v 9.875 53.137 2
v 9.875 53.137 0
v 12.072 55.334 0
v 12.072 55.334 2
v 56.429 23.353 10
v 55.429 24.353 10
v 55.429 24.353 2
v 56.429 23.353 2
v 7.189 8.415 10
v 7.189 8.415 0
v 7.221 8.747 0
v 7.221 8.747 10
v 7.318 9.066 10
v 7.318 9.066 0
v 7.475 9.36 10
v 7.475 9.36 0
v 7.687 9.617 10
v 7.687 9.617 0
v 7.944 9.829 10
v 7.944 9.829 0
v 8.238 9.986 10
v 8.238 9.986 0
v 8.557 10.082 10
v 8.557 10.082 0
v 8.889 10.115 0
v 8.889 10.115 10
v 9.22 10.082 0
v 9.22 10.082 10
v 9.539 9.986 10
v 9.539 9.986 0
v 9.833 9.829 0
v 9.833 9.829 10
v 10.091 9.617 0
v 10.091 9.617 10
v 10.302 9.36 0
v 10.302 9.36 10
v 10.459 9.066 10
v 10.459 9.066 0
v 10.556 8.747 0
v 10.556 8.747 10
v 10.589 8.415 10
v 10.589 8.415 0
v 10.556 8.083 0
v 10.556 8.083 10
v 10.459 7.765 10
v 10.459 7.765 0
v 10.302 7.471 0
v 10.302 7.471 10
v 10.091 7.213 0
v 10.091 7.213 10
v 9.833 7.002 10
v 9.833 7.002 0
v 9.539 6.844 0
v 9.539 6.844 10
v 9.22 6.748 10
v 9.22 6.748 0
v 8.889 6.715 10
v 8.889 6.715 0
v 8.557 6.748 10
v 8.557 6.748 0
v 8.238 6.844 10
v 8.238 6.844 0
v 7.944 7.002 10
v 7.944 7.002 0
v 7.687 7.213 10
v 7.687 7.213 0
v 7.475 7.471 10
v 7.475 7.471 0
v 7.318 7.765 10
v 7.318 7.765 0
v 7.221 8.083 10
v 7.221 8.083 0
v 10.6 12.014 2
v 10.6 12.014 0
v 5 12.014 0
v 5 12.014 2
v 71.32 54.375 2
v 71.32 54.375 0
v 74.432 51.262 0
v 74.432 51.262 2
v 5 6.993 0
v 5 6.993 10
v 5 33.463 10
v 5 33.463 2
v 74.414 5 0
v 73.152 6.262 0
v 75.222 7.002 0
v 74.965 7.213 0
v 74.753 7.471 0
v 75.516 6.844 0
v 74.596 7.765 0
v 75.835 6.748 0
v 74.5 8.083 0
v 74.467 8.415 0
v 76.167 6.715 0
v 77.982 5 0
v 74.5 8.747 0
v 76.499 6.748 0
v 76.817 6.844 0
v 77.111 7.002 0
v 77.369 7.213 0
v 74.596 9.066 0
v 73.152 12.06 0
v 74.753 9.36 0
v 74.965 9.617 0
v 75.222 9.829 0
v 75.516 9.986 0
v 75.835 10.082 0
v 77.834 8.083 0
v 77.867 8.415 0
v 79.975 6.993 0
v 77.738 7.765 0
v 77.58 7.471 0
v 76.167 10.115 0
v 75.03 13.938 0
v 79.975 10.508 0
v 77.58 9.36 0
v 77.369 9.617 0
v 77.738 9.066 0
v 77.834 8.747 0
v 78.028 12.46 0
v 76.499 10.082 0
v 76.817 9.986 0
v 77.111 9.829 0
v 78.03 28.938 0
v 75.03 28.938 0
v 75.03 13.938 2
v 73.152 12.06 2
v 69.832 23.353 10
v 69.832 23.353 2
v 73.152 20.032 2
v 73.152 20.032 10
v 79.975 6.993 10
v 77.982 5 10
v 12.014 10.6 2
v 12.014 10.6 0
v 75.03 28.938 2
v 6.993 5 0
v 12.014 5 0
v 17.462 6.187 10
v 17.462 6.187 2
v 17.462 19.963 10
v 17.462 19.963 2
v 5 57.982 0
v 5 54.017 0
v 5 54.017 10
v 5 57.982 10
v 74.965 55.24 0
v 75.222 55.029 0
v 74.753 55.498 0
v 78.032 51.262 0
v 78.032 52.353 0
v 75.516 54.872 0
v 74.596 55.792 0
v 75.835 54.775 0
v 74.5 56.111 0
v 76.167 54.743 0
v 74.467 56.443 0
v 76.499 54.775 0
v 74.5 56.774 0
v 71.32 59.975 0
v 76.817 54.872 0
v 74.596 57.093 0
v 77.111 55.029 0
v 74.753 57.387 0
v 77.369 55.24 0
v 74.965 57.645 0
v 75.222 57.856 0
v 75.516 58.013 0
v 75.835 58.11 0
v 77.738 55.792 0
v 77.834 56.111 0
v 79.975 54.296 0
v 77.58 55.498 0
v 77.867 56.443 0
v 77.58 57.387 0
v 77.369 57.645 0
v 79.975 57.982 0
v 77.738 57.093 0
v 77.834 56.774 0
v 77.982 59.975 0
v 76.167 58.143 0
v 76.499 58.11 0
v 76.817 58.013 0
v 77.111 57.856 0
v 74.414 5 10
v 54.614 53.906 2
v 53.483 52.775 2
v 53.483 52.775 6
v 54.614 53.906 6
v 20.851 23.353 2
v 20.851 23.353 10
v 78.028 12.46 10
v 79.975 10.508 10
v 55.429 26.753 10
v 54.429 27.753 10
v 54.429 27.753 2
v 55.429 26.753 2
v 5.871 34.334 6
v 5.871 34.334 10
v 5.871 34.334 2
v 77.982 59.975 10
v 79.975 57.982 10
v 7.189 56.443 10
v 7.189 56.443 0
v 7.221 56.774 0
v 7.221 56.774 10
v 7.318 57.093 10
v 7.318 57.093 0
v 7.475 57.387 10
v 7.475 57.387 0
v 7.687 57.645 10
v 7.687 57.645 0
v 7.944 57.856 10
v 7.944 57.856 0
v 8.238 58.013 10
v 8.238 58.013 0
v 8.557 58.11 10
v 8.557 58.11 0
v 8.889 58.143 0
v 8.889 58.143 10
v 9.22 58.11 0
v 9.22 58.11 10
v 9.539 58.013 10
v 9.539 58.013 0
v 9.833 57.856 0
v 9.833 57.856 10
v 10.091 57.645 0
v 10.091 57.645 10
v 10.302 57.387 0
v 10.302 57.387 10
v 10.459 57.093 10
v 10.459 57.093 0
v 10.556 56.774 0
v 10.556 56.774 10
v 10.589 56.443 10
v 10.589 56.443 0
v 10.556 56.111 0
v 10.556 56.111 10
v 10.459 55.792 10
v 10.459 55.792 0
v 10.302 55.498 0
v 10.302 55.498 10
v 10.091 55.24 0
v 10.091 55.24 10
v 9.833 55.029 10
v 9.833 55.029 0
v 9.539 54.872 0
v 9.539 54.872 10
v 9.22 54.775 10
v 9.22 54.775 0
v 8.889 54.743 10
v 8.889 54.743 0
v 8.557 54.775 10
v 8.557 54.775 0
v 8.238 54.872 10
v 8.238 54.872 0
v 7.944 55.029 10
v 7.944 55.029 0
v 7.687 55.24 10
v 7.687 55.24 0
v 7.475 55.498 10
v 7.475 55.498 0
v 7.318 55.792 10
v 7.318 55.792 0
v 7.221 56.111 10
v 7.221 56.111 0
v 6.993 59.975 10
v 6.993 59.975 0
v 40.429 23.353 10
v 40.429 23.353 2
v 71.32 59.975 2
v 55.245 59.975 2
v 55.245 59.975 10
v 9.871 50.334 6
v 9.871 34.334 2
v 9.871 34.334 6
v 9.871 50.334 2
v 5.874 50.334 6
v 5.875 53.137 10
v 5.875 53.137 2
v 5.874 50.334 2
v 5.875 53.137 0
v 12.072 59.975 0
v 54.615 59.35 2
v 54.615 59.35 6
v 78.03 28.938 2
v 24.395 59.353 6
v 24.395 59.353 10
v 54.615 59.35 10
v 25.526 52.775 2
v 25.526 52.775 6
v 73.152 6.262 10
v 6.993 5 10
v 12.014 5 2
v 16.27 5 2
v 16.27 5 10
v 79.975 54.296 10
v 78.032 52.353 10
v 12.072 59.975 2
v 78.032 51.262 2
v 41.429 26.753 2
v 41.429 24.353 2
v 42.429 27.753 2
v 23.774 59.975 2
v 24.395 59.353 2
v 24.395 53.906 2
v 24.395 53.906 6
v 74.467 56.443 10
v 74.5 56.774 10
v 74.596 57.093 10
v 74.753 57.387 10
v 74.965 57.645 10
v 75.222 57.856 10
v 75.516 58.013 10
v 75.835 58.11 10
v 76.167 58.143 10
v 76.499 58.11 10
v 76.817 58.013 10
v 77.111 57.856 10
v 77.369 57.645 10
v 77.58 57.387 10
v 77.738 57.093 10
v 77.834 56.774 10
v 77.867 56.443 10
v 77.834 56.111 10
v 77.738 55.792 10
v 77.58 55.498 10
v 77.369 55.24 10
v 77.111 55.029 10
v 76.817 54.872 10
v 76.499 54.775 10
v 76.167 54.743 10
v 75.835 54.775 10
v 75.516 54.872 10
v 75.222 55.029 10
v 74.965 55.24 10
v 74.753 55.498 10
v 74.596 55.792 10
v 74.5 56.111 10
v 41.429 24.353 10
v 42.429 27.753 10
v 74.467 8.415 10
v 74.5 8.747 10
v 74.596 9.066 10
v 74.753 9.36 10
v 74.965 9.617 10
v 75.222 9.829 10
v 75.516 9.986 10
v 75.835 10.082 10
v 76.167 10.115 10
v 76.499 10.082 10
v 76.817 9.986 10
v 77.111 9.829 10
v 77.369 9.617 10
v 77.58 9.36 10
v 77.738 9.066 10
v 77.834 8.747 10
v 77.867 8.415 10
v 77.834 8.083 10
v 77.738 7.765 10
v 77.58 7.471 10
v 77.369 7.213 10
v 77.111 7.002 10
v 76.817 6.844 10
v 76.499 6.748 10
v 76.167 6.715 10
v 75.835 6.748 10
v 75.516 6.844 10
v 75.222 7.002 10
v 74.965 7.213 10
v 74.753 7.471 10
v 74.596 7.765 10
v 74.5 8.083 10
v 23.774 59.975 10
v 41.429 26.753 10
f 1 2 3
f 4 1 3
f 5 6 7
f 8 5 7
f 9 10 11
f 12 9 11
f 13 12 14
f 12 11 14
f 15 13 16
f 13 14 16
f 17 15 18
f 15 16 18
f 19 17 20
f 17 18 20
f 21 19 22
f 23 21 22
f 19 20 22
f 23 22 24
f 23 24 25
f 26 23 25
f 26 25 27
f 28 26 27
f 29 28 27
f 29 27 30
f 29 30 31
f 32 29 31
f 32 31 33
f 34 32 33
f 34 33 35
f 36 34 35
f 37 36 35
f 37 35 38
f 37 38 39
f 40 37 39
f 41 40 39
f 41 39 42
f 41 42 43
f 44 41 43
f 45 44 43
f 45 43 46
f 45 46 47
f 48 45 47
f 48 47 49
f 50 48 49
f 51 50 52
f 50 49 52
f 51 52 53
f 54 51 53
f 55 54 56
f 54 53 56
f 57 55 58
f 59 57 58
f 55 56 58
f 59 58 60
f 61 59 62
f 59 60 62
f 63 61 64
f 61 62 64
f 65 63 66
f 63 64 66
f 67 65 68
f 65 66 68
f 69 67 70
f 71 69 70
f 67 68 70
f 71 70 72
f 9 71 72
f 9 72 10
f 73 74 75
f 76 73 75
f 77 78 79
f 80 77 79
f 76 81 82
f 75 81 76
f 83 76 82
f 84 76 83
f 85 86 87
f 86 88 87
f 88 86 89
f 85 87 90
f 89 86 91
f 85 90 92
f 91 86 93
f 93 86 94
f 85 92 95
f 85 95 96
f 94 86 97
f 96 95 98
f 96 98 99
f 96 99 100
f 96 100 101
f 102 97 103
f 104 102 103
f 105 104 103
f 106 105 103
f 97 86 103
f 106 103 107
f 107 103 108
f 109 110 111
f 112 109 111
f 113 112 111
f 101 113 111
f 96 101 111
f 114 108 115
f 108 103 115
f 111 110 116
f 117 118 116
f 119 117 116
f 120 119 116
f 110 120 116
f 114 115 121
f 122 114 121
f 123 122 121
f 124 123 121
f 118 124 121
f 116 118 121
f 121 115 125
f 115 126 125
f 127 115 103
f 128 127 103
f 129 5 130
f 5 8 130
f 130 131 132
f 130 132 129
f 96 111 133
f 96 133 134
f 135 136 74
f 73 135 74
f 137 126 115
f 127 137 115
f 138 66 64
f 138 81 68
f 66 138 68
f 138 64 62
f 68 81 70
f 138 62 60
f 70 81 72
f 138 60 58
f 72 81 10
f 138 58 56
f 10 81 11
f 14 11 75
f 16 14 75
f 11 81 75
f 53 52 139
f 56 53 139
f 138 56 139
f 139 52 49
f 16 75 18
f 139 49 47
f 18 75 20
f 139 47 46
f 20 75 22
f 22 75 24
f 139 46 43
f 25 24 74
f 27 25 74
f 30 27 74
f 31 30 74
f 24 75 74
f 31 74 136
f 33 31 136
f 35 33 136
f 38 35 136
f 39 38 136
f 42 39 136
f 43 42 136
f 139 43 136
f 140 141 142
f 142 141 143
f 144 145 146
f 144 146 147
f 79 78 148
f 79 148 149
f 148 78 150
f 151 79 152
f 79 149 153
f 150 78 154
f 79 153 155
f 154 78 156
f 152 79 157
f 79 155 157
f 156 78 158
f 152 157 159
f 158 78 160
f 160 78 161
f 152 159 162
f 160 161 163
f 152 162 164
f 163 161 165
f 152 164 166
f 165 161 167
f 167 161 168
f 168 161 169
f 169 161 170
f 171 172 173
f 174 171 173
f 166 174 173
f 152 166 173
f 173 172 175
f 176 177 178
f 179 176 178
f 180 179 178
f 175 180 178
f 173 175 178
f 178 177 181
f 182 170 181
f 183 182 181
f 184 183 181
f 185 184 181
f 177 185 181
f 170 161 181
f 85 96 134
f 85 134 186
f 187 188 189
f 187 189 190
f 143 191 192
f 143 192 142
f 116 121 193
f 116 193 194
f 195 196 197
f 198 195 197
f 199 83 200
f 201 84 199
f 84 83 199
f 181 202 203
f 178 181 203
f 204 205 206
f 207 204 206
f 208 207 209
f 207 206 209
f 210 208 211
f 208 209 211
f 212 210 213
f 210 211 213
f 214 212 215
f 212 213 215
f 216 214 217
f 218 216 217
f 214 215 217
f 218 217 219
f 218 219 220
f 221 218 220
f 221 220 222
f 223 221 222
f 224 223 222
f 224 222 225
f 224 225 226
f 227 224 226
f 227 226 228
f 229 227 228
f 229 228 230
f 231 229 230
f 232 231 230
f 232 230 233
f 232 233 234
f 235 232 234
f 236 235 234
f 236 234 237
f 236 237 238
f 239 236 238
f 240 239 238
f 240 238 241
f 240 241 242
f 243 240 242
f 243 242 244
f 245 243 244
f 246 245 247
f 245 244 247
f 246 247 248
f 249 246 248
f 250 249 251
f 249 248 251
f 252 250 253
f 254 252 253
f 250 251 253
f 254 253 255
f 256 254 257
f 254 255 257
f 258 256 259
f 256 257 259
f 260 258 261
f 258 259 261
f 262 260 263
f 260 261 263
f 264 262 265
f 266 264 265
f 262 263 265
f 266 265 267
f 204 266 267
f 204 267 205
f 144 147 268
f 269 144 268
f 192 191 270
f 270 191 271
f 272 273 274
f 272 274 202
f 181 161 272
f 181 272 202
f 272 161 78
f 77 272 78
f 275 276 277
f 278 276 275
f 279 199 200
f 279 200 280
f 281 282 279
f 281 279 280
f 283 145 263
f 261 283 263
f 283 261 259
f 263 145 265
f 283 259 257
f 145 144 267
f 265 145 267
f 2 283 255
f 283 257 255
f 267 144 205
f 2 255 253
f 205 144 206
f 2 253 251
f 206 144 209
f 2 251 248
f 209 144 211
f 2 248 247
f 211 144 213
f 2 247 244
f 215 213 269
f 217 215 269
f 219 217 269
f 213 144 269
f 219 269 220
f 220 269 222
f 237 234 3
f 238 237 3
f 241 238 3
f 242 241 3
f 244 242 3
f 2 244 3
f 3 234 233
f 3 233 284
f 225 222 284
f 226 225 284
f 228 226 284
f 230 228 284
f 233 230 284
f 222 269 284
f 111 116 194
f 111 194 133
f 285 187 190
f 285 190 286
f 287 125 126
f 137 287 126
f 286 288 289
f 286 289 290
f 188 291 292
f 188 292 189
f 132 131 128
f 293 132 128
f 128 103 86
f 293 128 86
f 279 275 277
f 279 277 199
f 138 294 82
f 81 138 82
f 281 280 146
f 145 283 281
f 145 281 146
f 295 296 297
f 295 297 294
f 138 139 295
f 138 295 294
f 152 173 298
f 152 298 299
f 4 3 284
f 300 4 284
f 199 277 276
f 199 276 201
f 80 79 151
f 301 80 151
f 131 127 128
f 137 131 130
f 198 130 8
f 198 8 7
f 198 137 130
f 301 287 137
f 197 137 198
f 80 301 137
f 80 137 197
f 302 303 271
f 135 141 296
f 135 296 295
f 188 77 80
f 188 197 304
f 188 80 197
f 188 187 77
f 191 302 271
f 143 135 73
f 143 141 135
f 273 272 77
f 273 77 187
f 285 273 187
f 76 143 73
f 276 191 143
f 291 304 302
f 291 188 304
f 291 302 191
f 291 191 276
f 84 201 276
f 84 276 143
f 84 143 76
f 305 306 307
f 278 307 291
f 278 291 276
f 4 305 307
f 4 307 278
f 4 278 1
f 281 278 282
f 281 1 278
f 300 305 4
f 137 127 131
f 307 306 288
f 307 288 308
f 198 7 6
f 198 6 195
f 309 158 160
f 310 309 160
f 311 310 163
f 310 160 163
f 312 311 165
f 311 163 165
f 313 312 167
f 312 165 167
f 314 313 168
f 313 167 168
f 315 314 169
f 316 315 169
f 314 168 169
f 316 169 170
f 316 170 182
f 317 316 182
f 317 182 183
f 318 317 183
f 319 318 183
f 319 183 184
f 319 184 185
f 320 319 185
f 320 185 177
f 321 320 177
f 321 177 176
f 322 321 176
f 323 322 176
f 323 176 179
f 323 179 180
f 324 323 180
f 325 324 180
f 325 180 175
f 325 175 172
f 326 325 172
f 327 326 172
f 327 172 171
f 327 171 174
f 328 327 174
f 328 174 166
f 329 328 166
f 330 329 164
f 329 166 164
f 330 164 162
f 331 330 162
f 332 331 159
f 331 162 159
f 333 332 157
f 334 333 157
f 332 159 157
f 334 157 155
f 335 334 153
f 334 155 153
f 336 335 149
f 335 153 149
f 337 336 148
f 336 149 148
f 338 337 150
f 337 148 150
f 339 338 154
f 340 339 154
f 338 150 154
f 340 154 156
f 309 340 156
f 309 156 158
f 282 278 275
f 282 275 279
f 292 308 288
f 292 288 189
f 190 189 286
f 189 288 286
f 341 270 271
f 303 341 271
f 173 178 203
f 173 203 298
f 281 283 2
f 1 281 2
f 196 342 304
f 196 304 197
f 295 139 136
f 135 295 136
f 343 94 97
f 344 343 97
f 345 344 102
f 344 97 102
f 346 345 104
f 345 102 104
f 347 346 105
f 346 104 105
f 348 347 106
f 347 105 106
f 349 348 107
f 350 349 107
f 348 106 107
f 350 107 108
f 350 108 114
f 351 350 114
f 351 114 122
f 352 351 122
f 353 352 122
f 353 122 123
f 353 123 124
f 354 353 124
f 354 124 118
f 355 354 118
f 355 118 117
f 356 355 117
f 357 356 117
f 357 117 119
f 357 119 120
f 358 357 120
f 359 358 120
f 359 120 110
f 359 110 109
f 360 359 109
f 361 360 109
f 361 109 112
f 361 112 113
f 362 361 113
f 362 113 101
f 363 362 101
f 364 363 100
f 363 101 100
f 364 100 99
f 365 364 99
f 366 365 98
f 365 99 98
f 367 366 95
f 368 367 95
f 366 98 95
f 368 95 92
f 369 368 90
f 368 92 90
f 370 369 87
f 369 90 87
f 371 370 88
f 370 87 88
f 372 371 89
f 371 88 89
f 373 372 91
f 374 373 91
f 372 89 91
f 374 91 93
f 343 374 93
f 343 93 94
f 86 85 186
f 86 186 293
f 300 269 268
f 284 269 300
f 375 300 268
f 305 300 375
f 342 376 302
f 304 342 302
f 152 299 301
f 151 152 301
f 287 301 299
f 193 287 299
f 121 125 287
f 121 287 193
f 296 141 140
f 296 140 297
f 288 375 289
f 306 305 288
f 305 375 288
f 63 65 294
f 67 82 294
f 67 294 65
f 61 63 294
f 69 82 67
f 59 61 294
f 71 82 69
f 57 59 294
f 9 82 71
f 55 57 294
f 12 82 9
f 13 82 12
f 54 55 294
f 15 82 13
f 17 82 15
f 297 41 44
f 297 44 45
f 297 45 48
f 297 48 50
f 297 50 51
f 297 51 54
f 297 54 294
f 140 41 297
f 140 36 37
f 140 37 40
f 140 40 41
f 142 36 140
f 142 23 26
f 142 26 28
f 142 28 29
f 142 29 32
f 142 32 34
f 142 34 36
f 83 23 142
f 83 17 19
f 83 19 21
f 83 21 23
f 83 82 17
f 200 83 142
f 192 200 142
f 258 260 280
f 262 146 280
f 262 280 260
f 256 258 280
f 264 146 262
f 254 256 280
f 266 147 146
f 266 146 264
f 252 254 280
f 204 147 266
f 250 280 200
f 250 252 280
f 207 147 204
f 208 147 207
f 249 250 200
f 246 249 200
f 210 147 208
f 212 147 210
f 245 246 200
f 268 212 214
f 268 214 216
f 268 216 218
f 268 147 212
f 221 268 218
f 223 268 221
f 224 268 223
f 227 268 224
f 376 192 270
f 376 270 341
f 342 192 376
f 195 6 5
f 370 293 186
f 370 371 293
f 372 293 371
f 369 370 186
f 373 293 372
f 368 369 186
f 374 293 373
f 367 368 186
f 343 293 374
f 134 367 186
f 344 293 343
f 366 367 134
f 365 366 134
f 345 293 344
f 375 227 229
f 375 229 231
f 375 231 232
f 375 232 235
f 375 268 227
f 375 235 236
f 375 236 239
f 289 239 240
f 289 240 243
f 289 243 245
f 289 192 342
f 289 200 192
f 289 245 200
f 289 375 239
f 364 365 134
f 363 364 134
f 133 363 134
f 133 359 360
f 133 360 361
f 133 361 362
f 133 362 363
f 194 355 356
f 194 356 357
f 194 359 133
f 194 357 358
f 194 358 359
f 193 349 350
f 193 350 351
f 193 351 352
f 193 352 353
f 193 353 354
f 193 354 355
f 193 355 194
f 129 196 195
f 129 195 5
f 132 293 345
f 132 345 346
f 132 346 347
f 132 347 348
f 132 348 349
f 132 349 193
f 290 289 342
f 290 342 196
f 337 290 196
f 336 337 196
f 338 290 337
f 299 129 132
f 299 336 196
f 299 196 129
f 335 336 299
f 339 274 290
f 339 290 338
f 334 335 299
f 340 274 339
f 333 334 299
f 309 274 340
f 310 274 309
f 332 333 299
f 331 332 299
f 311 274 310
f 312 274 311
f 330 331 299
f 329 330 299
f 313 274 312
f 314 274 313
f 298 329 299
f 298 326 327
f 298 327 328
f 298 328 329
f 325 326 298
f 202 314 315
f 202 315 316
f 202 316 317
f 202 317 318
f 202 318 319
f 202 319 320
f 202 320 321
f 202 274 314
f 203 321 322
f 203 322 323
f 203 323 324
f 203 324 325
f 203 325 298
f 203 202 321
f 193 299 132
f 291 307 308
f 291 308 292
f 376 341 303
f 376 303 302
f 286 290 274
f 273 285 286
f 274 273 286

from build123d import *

# Parameters (mm, degrees)
SKETCH_1_W           = 85
SKETCH_1_H           = 65
EXTRUDE_1_DEPTH      = 10
CUT_EXTRUDE_1_REACH  = 109.471
SKETCH_2_R           = 1.7
CUT_EXTRUDE_2_REACH  = 109.471
SKETCH_3_W           = 85
SKETCH_3_H           = 65
CUT_EXTRUDE_4_REACH  = 102.464
CUT_EXTRUDE_7_DEPTH  = 6
SKETCH_6_W           = 4
SKETCH_6_H           = 16
CUT_EXTRUDE_8_DEPTH  = 6
CUT_EXTRUDE_11_DEPTH = 2
SKETCH_15_W          = 14
SKETCH_15_H          = 4.4
CUT_EXTRUDE_13_DEPTH = 8
CHAMFER_1_SIZE       = 1


with BuildPart() as part:
    # 草图1 → 凸台-拉伸1 (new body)
    with BuildSketch(Plane.XY):
        with Locations((42.5, 32.5)):
            Rectangle(SKETCH_1_W, SKETCH_1_H)
    extrude(amount=EXTRUDE_1_DEPTH)

    # 草图2 → 切除-拉伸1 (cut, up to next)
    with BuildSketch(Plane(origin=(0, 0, 0), x_dir=(-1, 0, 0), z_dir=(0, 0, -1)), mode=Mode.PRIVATE) as cut_extrude_1_sk1:
        with Locations((-76.166921514, 56.442524765)):
            Circle(SKETCH_2_R)
    cut_extrude_1_tool1 = extrude(cut_extrude_1_sk1.sketch, amount=-CUT_EXTRUDE_1_REACH, mode=Mode.PRIVATE) & part.part
    # 草图2 → 切除-拉伸1 (cut, up to next)
    with BuildSketch(Plane(origin=(0, 0, 0), x_dir=(-1, 0, 0), z_dir=(0, 0, -1)), mode=Mode.PRIVATE) as cut_extrude_1_sk2:
        with Locations((-8.888803658, 56.442524765)):
            Circle(SKETCH_2_R)
    cut_extrude_1_tool2 = extrude(cut_extrude_1_sk2.sketch, amount=-CUT_EXTRUDE_1_REACH, mode=Mode.PRIVATE) & part.part
    # 草图2 → 切除-拉伸1 (cut, up to next)
    with BuildSketch(Plane(origin=(0, 0, 0), x_dir=(-1, 0, 0), z_dir=(0, 0, -1)), mode=Mode.PRIVATE) as cut_extrude_1_sk3:
        with Locations((-76.166921514, 8.41508509)):
            Circle(SKETCH_2_R)
    cut_extrude_1_tool3 = extrude(cut_extrude_1_sk3.sketch, amount=-CUT_EXTRUDE_1_REACH, mode=Mode.PRIVATE) & part.part
    # 草图2 → 切除-拉伸1 (cut, up to next)
    with BuildSketch(Plane(origin=(0, 0, 0), x_dir=(-1, 0, 0), z_dir=(0, 0, -1)), mode=Mode.PRIVATE) as cut_extrude_1_sk4:
        with Locations((-8.888803658, 8.41508509)):
            Circle(SKETCH_2_R)
    cut_extrude_1_tool4 = extrude(cut_extrude_1_sk4.sketch, amount=-CUT_EXTRUDE_1_REACH, mode=Mode.PRIVATE) & part.part
    add(cut_extrude_1_tool1.solids().sort_by_distance((76.166922, 56.442525, 0))[0], mode=Mode.SUBTRACT)
    add(cut_extrude_1_tool2.solids().sort_by_distance((8.888804, 56.442525, 0))[0], mode=Mode.SUBTRACT)
    add(cut_extrude_1_tool3.solids().sort_by_distance((76.166922, 8.415085, 0))[0], mode=Mode.SUBTRACT)
    add(cut_extrude_1_tool4.solids().sort_by_distance((8.888804, 8.415085, 0))[0], mode=Mode.SUBTRACT)

    # 草图3 → 切除-拉伸2 (cut, up to next)
    with BuildSketch(Plane(origin=(0, 0, 0), x_dir=(-1, 0, 0), z_dir=(0, 0, -1)), mode=Mode.PRIVATE) as cut_extrude_2_sk1:
        with Locations((-42.5, 32.5)):
            Rectangle(SKETCH_3_W, SKETCH_3_H)
        Polygon((-5, 33.462892894), (-5.871324699, 34.334217592), (-5.87504445, 53.137061214), (-5, 54.017366187), (-5, 57.982143592), (-6.992565577, 59.974709169), (-23.773560915, 59.974709169), (-24.394872914, 59.353397171), (-54.61482093, 59.349677419), (-55.245113202, 59.974709169), (-77.982184232, 59.974709169), (-79.974749809, 57.982143592), (-79.97474981, 54.295829484), (-78.032030648, 52.353110322), (-78.028310897, 12.45999492), (-79.97474981, 10.508295484), (-79.97474981, 6.992565577), (-77.982184232, 5), (-74.414239441, 5), (-73.152434681, 6.26180476), (-60.043505207, 6.265524511), (-58.772720173, 5), (-32.926479725, 5), (-31.743585303, 6.182894422), (-17.461559563, 6.186614173), (-16.269684867, 5), (-6.992565577, 5), (-5, 6.992565577), align=None, mode=Mode.SUBTRACT)
    cut_extrude_2_tool1 = extrude(cut_extrude_2_sk1.sketch, amount=-CUT_EXTRUDE_2_REACH, mode=Mode.PRIVATE) & part.part
    add(cut_extrude_2_tool1.solids().sort_by_distance((42.5, 63.929953, 0))[0], mode=Mode.SUBTRACT)

    # 草图4 → 切除-拉伸4 (cut, up to next)
    with BuildSketch(Plane(origin=(0, 0, 0), x_dir=(-1, 0, 0), z_dir=(0, 0, -1)), mode=Mode.PRIVATE) as cut_extrude_4_sk1:
        Polygon((-73.152434681, 6.26180476), (-73.152434681, 20.032317315), (-69.831576581, 23.353175415), (-46.787984184, 23.353175415), (-20.851296271, 23.353175415), (-17.461559563, 19.963438707), (-17.461559563, 6.186614173), (-17.461559563, 0.193960815), (-73.152434681, 0.193960815), align=None)
    cut_extrude_4_tool1 = extrude(cut_extrude_4_sk1.sketch, amount=-CUT_EXTRUDE_4_REACH, mode=Mode.PRIVATE) & part.part
    add(cut_extrude_4_tool1.solids().sort_by_distance((45.311727, 11.681443, 0))[0], mode=Mode.SUBTRACT)

    # 草图5 → 切除-拉伸7 (cut)
    with BuildSketch(Plane(origin=(0, 0, 0), x_dir=(-1, 0, 0), z_dir=(0, 0, -1))):
        Polygon((-24.394872914, 59.353397171), (-24.394872914, 53.906418167), (-25.526104495, 52.774908066), (-53.482640788, 52.774908066), (-54.614150889, 53.906139647), (-54.61482093, 59.349677419), align=None)
    extrude(amount=-CUT_EXTRUDE_7_DEPTH, mode=Mode.SUBTRACT)

    # 草图6 → 切除-拉伸8 (cut)
    with BuildSketch(Plane(origin=(0, 0, 0), x_dir=(-1, 0, 0), z_dir=(0, 0, -1))):
        with Locations((-7.871324699, 42.334217592)):
            Rectangle(SKETCH_6_W, SKETCH_6_H)
    extrude(amount=-CUT_EXTRUDE_8_DEPTH, mode=Mode.SUBTRACT)

    # 草图7 → 切除-拉伸11 (cut)
    with BuildSketch(Plane(origin=(0, 0, 0), x_dir=(-1, 0, 0), z_dir=(0, 0, -1))):
        Polygon((-74.432117646, 51.26230094), (-76.432117646, 51.26230094), (-78.031928938, 51.26230094), (-78.029847328, 28.93771831), (-75.029847328, 28.93771831), (-75.029847328, 13.93771831), (-73.152434681, 12.060305663), (-73.152434681, 20.032317315), (-69.831576581, 23.353175415), (-20.851296271, 23.353175415), (-17.461559563, 19.963438707), (-17.461559563, 6.186614173), (-16.269684867, 5), (-12.014024847, 5), (-12.014024847, 10.599811284), (-10.599811284, 12.014024847), (-6.599811284, 12.014024847), (-5, 12.014024847), (-5, 33.462892894), (-5.871324699, 34.334217592), (-9.871324699, 34.334217592), (-9.871324699, 50.334217592), (-5.874489966, 50.334217592), (-5.87504445, 53.137061214), (-9.87504445, 53.137061214), (-12.071959353, 55.333976117), (-12.071959353, 58.333976117), (-12.071959353, 59.974709169), (-23.773560915, 59.974709169), (-24.394872914, 59.353397171), (-24.394872914, 53.906418167), (-25.526104495, 52.774908066), (-53.482640788, 52.774908066), (-54.614150889, 53.906139647), (-54.61482093, 59.349677419), (-55.245113202, 59.974709169), (-71.319520701, 59.974709169), (-71.319520701, 58.374897885), (-71.319520701, 54.374897885), align=None)
    extrude(amount=-CUT_EXTRUDE_11_DEPTH, mode=Mode.SUBTRACT)

    # 草图15 → 切除-拉伸13 (cut)
    with BuildSketch(Plane.XY.offset(10)):
        with Locations((48.428848604, 25.553175415)):
            Rectangle(SKETCH_15_W, SKETCH_15_H)
    extrude(amount=-CUT_EXTRUDE_13_DEPTH, mode=Mode.SUBTRACT)

    # 倒角1
    chamfer_1_edges = [part.edges().sort_by_distance(p)[0] for p in [
        (55.428848604, 23.353175415, 6),
        (55.428848604, 27.753175415, 6),
        (41.428848604, 27.753175415, 6),
        (41.428848604, 23.353175415, 6),
    ]]
    chamfer(chamfer_1_edges, length=CHAMFER_1_SIZE)


solid = part.part
